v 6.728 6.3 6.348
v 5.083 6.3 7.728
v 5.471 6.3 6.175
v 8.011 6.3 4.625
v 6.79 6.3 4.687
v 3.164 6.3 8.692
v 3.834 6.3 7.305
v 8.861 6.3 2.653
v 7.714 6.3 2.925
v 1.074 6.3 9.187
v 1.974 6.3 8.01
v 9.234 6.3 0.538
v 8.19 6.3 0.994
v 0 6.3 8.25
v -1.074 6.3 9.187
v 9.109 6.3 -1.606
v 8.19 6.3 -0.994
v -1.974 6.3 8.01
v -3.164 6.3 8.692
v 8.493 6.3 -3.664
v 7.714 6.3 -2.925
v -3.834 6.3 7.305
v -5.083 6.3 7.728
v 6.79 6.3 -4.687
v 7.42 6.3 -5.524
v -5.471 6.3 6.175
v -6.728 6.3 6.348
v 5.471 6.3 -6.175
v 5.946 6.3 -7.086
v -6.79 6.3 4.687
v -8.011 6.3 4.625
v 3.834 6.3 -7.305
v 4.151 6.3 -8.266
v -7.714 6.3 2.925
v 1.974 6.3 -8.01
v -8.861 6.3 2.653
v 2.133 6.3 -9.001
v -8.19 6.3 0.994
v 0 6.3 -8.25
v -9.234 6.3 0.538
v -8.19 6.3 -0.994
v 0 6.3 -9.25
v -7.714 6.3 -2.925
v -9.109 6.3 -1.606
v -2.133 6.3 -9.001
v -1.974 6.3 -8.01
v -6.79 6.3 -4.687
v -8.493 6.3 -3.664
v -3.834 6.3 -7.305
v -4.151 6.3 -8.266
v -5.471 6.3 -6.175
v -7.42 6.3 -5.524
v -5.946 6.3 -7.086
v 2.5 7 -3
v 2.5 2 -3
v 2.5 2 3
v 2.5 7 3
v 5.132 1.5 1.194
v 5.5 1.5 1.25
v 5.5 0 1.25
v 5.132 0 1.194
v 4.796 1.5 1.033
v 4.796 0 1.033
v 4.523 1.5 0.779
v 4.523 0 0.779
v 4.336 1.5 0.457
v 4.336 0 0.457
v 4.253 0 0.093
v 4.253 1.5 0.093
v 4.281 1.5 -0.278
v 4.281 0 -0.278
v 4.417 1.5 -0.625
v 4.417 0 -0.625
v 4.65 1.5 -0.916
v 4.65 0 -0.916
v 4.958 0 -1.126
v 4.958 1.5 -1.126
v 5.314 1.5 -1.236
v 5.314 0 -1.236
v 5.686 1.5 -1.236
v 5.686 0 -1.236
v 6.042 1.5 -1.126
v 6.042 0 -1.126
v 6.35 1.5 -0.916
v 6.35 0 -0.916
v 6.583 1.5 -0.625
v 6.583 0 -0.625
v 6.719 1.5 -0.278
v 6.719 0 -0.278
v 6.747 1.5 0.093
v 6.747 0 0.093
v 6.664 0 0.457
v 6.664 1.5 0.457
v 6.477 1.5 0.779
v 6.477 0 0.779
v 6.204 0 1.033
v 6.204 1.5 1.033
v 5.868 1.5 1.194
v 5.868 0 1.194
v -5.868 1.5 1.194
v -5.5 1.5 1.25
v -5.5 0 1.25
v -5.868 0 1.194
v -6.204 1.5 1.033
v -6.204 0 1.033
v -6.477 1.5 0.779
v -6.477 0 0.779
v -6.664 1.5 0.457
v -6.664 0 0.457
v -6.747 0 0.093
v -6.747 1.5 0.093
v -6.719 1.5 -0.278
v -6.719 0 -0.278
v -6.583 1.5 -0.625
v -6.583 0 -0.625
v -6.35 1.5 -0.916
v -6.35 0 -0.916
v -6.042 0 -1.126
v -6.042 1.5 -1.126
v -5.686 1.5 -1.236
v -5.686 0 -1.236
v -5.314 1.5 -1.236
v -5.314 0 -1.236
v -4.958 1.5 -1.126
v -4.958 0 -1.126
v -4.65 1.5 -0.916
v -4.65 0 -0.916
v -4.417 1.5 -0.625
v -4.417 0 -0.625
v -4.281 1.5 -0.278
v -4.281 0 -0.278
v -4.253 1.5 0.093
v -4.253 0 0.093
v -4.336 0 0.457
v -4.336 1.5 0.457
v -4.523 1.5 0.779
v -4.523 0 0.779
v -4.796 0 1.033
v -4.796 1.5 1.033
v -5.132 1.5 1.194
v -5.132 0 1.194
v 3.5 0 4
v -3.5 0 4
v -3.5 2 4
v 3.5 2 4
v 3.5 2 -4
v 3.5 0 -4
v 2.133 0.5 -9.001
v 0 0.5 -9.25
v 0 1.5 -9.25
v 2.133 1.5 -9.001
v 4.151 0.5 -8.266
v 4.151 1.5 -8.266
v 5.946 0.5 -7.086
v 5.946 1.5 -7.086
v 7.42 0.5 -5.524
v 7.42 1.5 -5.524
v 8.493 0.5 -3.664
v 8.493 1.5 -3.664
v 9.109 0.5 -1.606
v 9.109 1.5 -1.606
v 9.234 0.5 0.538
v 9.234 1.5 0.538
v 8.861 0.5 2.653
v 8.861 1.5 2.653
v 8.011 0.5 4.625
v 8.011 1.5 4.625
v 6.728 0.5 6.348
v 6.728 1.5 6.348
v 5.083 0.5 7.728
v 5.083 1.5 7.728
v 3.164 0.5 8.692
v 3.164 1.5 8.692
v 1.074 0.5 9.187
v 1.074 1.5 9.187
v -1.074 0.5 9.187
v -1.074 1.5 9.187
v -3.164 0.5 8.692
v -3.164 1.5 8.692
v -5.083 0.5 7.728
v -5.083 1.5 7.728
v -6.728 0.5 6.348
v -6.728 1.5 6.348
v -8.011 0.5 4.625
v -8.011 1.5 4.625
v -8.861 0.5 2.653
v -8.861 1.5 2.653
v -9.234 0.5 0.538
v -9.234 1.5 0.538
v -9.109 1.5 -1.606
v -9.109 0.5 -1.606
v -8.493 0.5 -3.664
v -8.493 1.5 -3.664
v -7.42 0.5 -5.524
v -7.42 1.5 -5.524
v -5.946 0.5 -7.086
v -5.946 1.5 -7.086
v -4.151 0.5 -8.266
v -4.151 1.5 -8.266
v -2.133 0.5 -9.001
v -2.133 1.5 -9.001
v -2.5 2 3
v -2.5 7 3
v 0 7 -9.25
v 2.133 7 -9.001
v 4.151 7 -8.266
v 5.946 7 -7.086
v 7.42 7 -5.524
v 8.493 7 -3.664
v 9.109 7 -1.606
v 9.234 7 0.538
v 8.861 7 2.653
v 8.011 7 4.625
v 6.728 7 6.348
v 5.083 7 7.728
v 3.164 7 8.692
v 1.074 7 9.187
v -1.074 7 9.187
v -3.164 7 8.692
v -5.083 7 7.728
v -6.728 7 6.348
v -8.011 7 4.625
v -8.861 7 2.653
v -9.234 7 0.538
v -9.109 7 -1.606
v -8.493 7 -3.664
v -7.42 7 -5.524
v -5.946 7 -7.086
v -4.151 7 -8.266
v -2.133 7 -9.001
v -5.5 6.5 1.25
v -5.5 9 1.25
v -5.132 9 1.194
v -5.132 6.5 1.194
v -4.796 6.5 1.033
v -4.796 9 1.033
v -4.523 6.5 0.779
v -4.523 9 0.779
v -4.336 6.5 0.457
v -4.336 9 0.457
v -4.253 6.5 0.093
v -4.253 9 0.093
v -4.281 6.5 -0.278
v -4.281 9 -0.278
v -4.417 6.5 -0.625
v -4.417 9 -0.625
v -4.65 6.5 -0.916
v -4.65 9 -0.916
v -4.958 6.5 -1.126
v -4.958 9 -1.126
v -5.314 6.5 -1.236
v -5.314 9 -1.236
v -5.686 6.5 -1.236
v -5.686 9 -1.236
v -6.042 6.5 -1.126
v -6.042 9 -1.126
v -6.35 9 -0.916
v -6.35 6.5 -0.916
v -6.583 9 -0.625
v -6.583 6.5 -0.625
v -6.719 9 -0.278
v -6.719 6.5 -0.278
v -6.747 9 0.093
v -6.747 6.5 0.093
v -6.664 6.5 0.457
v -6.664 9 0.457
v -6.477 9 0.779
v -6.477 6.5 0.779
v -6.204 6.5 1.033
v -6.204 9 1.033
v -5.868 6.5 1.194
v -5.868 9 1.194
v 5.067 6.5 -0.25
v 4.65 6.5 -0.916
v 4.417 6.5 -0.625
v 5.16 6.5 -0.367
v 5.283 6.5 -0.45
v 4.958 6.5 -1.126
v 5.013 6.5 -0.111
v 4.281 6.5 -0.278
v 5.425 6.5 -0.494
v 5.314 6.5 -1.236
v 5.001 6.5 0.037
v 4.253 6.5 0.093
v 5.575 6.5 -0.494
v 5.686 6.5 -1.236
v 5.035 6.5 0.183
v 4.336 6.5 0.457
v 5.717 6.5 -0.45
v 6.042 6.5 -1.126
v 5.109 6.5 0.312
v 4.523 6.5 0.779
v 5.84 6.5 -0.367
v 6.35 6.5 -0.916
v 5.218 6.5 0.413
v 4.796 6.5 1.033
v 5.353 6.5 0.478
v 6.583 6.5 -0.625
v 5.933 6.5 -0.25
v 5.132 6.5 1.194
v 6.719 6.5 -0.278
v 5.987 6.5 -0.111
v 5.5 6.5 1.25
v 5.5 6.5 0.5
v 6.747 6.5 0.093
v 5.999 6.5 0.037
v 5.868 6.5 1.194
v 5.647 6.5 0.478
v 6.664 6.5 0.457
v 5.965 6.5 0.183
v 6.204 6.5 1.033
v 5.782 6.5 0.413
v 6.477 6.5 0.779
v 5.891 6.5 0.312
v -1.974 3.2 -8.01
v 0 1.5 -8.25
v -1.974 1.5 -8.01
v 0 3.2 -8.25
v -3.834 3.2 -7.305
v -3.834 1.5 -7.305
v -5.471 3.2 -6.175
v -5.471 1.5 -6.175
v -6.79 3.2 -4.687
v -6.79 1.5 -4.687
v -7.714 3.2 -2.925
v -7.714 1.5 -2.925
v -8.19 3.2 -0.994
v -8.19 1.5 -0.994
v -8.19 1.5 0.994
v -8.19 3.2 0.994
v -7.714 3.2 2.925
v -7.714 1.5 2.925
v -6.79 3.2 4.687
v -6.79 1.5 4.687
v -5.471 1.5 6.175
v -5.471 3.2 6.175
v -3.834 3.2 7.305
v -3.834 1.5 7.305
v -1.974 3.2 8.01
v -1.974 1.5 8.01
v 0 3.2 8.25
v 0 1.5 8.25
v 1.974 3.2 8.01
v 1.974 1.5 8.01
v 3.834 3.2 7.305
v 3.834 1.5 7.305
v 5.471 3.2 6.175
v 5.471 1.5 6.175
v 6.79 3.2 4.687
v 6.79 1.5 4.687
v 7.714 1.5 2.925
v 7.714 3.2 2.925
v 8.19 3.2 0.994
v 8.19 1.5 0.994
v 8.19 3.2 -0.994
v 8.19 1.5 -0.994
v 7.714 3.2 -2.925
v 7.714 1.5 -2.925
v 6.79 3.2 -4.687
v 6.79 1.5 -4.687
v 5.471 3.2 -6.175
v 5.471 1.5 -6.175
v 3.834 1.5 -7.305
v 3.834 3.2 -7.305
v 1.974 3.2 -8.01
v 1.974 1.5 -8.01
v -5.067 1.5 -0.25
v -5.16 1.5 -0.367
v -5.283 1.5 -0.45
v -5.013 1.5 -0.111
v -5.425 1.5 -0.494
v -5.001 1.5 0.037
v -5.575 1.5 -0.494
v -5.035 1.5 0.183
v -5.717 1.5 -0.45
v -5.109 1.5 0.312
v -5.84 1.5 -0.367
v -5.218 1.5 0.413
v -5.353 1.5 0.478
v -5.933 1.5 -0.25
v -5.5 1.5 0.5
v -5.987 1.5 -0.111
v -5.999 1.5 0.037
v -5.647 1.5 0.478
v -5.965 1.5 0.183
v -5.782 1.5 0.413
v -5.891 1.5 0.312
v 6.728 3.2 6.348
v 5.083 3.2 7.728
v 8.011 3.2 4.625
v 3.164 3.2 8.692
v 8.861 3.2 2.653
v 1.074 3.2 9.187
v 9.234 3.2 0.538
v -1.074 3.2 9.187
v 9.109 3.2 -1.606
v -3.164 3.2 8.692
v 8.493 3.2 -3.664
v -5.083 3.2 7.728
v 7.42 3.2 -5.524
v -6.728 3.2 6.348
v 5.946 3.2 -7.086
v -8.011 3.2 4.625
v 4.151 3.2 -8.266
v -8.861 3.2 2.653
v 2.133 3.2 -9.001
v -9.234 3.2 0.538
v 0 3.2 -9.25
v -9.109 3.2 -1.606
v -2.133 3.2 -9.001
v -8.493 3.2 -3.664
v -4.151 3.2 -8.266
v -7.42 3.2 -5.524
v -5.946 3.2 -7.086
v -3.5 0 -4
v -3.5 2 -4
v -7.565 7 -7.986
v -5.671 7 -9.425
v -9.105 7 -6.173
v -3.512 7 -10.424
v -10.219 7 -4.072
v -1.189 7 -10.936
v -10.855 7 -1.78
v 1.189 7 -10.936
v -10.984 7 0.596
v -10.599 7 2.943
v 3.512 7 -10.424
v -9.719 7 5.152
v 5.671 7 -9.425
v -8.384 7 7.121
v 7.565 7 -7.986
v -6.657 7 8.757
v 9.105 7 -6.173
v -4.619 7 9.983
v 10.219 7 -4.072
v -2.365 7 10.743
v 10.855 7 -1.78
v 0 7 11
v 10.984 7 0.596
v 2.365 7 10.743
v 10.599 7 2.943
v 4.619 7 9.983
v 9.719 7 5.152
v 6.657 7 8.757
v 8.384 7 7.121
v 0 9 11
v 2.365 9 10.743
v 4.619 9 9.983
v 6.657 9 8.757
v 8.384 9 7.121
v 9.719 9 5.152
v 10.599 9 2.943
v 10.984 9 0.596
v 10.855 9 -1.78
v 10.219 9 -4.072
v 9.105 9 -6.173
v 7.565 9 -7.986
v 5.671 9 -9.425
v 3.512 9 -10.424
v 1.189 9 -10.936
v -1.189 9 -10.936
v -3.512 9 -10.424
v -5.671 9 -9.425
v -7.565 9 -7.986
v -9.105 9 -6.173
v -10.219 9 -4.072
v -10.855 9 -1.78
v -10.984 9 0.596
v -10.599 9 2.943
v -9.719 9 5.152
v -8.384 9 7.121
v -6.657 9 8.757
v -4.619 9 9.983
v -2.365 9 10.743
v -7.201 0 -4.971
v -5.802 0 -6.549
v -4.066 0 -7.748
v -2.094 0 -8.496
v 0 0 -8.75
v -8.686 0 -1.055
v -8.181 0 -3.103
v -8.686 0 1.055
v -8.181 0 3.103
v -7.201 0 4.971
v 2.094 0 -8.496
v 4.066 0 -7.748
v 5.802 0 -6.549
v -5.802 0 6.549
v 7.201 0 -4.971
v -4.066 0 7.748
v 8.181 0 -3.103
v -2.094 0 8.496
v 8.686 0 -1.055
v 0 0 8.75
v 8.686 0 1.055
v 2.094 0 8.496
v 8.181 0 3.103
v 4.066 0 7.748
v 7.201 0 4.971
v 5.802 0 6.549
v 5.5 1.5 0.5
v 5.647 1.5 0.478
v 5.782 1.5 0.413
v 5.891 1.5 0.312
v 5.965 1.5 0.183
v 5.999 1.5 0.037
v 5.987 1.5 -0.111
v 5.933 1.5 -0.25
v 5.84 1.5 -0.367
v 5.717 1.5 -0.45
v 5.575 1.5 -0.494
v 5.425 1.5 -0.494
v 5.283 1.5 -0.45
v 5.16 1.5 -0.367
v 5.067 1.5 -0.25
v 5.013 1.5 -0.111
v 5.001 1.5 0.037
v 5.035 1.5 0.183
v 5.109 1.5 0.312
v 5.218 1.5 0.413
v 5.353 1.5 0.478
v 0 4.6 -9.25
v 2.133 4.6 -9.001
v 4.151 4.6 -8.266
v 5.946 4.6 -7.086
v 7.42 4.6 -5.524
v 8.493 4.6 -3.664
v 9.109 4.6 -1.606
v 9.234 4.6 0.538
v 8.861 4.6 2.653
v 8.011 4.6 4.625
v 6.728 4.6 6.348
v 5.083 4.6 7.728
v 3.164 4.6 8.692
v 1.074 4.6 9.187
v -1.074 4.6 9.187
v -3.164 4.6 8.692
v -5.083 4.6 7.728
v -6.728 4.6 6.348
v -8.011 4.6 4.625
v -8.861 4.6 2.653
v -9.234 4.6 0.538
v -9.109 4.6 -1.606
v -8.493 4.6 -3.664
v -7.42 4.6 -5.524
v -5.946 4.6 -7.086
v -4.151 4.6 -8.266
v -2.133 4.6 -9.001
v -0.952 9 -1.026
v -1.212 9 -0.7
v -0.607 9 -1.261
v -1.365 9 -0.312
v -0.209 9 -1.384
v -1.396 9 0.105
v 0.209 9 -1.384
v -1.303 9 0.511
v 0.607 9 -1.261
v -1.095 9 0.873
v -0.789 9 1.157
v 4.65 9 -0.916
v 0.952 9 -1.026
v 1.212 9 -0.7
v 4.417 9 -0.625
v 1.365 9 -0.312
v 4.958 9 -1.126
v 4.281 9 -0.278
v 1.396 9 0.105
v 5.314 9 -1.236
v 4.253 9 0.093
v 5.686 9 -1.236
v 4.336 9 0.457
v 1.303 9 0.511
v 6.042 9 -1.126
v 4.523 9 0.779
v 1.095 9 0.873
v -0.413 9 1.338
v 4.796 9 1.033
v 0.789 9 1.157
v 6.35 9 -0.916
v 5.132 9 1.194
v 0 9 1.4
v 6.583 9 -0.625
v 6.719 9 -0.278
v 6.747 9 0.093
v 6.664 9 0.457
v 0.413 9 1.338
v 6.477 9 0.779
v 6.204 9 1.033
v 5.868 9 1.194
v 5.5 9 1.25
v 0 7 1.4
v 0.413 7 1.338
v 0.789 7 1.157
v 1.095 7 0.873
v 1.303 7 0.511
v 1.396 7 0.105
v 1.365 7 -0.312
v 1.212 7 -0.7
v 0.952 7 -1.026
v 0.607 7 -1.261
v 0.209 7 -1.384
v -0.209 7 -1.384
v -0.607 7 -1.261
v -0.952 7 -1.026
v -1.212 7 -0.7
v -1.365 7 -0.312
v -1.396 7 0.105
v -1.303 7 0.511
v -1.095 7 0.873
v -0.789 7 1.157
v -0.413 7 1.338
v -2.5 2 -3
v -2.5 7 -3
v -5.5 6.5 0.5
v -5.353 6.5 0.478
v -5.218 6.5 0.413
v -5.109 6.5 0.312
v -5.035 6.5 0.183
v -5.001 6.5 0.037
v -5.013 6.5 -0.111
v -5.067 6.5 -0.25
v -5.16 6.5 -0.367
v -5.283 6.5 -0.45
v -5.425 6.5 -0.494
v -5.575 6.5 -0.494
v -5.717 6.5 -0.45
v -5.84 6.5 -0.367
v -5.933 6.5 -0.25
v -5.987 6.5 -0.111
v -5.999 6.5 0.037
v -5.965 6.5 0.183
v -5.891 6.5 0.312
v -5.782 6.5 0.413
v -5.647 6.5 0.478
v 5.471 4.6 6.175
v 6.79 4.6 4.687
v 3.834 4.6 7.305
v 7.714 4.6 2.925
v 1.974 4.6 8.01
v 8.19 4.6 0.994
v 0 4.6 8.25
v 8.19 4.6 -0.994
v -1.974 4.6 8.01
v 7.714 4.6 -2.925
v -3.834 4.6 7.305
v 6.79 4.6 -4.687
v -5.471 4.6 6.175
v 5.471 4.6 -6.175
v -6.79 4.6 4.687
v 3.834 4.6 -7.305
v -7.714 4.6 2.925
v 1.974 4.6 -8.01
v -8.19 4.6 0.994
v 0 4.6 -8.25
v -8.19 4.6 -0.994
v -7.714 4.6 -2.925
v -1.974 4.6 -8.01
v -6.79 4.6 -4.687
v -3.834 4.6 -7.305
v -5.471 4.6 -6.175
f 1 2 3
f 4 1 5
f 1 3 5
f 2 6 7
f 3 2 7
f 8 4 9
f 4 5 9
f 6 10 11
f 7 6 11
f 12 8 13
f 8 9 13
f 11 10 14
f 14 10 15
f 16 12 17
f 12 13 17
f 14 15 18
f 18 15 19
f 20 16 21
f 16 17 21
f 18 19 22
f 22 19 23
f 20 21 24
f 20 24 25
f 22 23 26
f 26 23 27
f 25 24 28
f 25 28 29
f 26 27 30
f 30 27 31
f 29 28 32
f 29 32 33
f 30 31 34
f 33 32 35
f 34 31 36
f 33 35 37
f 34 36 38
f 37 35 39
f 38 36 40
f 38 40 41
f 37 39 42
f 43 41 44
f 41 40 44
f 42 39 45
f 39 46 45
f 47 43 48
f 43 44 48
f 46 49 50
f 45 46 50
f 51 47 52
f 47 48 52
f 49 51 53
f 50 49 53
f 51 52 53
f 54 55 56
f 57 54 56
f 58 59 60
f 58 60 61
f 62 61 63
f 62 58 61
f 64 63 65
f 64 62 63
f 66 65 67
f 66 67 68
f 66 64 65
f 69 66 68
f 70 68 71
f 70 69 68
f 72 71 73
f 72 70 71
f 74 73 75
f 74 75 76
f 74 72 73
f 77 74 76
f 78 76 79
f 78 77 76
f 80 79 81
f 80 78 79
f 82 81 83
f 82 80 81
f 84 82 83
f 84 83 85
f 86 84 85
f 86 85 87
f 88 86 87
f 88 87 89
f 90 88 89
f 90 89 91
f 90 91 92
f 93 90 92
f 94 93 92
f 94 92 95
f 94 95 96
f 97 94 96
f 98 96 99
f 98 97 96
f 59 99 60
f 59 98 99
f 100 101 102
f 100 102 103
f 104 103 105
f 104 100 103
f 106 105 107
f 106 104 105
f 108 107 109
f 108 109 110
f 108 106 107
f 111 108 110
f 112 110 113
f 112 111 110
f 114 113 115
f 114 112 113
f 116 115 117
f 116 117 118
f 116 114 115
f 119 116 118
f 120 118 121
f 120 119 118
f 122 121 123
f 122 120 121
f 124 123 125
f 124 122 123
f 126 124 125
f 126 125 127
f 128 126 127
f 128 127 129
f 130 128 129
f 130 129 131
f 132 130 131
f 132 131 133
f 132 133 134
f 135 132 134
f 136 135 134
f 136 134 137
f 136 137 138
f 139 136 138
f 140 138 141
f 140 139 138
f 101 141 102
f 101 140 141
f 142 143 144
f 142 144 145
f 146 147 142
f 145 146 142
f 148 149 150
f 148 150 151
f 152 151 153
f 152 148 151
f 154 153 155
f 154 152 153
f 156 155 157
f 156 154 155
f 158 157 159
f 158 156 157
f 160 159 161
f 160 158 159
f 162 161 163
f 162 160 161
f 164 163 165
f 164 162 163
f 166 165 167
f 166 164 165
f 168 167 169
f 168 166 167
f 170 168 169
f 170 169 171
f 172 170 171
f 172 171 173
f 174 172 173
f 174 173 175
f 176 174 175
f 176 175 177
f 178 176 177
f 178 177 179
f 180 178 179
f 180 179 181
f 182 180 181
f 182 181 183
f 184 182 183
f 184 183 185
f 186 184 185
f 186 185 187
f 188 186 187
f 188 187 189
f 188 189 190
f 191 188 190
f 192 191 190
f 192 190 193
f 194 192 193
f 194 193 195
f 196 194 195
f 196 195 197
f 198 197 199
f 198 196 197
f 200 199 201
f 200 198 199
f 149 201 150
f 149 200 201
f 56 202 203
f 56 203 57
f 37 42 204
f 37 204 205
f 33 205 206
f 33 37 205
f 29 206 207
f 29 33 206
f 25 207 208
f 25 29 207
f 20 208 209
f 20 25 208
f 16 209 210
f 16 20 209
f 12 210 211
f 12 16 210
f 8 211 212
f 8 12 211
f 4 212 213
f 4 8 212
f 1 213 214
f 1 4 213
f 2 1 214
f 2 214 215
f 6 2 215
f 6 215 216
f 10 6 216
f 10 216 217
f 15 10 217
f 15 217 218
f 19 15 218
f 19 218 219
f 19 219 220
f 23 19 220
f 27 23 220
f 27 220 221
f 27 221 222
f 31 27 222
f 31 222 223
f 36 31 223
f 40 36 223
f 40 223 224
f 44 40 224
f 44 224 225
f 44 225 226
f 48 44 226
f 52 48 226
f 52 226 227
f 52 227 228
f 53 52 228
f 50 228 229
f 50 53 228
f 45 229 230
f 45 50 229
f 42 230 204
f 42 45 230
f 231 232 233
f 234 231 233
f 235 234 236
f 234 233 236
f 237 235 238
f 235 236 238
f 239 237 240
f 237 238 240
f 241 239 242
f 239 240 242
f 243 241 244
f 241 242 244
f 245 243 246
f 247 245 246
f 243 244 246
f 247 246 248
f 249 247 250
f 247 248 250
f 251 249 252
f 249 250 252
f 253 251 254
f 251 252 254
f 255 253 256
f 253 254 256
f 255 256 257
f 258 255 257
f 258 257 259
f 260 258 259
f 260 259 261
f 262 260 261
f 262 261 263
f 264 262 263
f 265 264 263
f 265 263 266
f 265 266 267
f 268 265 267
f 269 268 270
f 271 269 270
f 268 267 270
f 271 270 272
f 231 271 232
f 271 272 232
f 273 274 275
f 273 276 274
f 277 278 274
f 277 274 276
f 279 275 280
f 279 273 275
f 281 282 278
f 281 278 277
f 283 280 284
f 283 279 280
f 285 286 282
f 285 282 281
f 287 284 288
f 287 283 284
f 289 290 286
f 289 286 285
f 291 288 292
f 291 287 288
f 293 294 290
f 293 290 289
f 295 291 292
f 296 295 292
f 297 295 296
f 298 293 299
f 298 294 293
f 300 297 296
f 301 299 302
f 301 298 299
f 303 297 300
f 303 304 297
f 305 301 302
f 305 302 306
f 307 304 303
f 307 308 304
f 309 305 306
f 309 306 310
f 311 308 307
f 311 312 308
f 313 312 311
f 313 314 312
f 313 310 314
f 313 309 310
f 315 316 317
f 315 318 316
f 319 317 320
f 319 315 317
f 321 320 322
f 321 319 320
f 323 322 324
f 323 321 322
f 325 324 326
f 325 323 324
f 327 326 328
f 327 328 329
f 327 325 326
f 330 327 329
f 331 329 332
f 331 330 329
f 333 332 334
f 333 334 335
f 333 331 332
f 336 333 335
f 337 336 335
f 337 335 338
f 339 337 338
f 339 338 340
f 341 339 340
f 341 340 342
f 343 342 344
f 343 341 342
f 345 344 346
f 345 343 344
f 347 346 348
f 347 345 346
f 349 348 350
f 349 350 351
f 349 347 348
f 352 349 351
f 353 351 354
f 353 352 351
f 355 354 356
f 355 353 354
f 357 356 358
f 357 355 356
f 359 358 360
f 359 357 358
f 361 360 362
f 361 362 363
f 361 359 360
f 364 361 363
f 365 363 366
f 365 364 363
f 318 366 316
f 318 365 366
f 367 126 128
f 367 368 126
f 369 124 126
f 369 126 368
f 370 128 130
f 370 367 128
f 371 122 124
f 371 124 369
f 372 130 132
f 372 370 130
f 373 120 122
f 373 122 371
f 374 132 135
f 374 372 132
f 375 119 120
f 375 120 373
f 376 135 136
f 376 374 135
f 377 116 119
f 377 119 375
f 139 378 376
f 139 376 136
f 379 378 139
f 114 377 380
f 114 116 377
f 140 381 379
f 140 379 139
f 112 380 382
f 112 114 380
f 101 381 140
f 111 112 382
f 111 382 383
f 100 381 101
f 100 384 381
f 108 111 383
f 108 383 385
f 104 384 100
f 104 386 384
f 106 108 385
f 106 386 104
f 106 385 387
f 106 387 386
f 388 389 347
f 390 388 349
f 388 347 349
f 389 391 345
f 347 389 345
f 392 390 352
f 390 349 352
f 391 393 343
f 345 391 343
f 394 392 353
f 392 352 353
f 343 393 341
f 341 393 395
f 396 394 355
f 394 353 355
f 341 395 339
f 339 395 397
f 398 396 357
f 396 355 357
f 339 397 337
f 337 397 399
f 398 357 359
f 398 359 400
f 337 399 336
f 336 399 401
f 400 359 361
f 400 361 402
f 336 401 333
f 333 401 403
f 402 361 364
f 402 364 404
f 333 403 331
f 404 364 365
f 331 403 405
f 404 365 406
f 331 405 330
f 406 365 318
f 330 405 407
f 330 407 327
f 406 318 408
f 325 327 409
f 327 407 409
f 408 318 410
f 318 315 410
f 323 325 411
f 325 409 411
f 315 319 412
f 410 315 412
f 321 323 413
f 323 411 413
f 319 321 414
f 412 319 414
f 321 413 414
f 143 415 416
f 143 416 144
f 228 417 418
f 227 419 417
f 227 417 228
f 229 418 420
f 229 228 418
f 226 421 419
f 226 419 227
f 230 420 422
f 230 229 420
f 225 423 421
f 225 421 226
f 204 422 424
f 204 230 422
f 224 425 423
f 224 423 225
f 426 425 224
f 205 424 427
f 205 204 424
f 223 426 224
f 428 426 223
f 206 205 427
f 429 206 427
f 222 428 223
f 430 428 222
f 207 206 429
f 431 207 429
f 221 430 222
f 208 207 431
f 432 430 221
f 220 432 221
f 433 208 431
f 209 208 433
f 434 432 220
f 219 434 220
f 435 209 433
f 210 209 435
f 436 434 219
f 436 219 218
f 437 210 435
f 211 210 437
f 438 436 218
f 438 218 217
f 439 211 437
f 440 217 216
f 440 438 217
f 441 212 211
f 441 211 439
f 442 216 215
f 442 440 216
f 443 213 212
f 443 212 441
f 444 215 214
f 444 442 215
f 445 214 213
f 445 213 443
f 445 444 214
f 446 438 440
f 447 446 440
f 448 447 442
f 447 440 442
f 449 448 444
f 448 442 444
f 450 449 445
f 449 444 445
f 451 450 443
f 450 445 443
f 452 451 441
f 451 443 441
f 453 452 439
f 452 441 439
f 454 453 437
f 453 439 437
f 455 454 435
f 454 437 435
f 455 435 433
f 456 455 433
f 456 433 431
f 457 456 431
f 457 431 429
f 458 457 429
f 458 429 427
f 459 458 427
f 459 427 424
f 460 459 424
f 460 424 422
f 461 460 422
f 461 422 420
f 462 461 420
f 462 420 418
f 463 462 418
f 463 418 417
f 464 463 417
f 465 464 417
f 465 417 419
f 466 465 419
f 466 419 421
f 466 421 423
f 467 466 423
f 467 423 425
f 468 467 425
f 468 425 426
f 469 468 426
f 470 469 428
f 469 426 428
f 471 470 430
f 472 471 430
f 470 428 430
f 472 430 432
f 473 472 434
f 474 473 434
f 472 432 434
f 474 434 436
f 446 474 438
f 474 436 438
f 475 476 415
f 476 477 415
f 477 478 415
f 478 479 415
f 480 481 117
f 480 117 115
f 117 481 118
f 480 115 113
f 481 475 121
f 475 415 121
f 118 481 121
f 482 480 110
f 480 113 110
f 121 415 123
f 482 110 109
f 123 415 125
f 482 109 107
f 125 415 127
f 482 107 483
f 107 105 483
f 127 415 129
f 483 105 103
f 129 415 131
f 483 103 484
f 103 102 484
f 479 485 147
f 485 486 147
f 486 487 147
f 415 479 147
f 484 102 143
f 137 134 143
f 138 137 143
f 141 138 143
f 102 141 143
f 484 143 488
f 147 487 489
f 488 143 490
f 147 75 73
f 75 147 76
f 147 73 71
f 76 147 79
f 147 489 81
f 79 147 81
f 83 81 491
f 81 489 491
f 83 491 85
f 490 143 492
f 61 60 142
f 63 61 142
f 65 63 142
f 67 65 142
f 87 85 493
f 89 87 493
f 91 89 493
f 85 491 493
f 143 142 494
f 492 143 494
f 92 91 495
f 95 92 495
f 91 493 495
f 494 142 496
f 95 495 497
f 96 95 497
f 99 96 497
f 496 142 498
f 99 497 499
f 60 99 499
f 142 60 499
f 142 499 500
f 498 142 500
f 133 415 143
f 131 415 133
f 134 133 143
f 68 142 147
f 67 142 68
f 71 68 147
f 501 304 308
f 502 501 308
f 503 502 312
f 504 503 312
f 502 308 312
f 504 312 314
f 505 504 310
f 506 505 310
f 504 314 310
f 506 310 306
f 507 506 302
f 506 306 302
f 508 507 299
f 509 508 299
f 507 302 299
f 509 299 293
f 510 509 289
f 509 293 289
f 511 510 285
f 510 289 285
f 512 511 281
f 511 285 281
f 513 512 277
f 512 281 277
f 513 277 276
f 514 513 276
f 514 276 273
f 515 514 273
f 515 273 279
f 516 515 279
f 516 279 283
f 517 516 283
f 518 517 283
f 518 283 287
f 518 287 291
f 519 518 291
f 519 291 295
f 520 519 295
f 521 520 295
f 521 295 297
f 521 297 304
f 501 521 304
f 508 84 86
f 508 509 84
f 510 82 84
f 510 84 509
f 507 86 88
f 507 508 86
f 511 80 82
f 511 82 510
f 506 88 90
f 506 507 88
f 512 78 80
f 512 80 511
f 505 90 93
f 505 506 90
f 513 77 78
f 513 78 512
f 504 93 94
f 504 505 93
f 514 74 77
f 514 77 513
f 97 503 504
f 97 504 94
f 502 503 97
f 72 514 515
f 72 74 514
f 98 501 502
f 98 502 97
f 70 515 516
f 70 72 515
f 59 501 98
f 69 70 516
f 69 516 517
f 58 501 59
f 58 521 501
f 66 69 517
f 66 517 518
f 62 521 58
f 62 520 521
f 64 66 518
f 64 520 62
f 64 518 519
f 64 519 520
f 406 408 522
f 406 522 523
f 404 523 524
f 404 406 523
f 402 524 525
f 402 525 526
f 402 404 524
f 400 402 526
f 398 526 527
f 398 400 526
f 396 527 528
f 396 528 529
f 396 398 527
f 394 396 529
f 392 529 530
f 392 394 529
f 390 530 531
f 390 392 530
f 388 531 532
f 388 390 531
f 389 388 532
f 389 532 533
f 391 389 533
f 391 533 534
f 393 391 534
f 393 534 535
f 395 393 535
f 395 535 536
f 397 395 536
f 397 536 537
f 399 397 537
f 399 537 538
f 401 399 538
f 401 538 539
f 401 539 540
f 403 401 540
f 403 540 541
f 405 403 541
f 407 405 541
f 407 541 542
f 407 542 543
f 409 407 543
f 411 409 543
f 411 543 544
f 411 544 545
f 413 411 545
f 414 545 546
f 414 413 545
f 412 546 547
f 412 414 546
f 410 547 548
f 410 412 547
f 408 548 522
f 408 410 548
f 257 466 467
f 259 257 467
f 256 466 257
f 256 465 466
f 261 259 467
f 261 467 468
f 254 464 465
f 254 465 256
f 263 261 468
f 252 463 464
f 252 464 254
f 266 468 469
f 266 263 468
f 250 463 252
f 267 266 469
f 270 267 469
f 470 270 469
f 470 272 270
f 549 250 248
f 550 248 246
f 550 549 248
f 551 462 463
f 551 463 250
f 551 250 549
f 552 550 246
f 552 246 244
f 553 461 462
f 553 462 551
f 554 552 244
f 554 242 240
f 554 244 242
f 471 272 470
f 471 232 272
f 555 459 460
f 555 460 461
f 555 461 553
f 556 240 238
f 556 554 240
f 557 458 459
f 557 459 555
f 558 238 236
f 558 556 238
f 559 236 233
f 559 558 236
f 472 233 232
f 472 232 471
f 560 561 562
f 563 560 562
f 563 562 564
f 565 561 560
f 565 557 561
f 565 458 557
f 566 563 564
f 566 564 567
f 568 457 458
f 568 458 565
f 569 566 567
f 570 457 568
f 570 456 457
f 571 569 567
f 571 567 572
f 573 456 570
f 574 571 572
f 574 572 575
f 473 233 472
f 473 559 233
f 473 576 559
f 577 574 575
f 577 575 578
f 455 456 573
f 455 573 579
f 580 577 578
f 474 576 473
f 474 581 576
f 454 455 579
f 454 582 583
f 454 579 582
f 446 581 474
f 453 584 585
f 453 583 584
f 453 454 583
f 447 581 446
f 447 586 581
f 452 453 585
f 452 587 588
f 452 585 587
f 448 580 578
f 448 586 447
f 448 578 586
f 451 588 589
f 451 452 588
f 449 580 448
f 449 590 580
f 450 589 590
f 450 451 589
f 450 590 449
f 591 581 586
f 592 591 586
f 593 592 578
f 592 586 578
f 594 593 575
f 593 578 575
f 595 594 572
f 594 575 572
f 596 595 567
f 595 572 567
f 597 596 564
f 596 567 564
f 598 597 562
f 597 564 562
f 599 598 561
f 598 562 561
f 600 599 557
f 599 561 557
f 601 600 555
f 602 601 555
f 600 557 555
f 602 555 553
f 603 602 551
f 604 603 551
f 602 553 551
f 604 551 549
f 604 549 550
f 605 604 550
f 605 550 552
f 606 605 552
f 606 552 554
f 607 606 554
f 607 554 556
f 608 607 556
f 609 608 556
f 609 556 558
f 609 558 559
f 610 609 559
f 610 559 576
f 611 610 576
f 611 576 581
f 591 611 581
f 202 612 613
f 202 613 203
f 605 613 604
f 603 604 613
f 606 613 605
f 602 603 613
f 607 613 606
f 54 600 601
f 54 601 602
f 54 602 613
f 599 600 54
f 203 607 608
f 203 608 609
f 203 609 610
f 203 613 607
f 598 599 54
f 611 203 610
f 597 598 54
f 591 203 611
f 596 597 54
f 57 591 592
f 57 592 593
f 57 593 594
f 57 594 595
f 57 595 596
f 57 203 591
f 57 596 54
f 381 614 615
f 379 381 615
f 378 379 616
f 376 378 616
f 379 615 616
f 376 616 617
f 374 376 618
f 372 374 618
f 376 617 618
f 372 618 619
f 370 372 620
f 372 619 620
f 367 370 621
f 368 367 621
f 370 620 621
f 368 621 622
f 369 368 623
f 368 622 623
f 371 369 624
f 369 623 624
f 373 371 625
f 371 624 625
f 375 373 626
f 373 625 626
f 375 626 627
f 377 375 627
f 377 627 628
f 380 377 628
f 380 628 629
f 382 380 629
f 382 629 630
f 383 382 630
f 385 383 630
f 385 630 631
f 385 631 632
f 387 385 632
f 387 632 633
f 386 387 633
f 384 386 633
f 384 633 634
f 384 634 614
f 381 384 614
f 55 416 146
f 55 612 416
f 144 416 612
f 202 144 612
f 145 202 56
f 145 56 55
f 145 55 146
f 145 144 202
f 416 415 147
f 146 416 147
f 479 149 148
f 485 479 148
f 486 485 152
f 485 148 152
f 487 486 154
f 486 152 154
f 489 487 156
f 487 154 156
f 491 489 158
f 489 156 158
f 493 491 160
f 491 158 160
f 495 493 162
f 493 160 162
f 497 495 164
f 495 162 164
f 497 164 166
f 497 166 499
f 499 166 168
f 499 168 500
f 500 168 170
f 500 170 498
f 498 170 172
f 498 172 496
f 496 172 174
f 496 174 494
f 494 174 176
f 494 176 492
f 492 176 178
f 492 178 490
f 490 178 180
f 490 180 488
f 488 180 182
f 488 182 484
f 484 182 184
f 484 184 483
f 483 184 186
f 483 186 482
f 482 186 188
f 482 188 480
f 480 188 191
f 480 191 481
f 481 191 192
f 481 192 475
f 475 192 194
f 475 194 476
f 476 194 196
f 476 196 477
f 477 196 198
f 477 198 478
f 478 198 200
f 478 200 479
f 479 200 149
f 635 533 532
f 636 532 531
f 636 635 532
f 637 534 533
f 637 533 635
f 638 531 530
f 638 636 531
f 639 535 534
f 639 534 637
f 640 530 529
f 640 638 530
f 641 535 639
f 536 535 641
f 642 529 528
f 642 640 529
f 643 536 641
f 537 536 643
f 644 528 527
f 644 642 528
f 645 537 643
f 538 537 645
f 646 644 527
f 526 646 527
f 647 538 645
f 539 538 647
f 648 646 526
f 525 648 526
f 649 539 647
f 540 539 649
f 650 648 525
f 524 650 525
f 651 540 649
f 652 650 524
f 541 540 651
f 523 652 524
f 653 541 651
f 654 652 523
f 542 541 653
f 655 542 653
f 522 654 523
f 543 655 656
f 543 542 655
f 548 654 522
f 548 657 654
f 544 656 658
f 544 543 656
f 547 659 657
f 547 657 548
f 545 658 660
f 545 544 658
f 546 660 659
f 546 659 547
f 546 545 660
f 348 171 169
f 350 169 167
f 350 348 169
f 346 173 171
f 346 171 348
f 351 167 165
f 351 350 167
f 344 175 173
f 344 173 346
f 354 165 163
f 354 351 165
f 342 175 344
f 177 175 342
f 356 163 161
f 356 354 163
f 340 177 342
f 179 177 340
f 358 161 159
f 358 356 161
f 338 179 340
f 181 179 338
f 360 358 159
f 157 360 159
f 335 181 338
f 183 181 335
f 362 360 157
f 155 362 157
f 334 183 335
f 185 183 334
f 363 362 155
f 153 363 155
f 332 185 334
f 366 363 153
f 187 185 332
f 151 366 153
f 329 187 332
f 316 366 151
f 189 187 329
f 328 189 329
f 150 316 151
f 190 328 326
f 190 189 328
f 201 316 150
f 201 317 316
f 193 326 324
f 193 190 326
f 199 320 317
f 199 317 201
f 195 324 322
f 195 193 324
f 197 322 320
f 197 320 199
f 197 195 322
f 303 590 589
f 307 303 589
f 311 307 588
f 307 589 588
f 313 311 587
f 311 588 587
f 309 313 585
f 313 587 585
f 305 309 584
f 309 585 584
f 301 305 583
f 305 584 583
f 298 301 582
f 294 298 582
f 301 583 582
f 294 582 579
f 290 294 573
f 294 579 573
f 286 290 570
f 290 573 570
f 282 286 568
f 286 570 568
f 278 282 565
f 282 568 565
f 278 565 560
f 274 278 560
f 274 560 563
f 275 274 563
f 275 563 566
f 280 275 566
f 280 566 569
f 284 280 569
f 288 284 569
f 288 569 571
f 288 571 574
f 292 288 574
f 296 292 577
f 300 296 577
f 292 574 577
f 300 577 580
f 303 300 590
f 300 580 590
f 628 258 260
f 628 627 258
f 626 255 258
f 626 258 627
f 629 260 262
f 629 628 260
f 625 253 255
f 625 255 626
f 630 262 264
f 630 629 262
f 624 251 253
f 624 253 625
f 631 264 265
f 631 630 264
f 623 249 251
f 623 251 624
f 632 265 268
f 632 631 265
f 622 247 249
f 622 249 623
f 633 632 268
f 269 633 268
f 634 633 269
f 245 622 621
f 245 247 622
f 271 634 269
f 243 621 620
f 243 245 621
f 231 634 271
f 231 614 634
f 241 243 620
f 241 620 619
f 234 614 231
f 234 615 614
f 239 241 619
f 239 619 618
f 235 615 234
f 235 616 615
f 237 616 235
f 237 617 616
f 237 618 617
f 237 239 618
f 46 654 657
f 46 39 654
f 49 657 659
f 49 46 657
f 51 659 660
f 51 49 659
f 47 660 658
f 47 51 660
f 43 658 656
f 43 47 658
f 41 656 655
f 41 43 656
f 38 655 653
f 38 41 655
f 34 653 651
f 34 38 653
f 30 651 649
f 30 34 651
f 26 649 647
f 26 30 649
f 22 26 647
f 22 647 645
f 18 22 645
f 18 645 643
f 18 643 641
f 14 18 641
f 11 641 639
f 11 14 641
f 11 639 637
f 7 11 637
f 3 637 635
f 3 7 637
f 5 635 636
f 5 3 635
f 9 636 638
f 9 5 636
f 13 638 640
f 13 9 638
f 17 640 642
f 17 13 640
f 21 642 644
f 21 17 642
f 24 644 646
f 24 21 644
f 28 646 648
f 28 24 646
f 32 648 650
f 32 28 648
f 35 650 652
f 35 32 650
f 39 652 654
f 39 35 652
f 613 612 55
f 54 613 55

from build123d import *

# Parameters (mm, degrees)
SKETCH_1_R          = 11
EXTRUDE_1_DEPTH     = 9
SKETCH_2_R          = 0.5
CUT_EXTRUDE_1_DEPTH = 18.972200756
SKETCH_3_R          = 16.549134696
SKETCH_3_R_2        = 9.25
CUT_EXTRUDE_2_DEPTH = 7
SKETCH_4_W          = 2
SKETCH_4_H          = 1.7
SKETCH_5_W          = 5
SKETCH_5_H          = 6
CUT_EXTRUDE_3_DEPTH = 7
SKETCH_6_R          = 1.4
CUT_EXTRUDE_4_DEPTH = 7
SKETCH_7_R          = 1.25
CUT_EXTRUDE_5_DEPTH = 2.5
CUT_EXTRUDE_START   = -1.5
SKETCH_8_R          = 1.25
CUT_EXTRUDE_6_DEPTH = 1.5
SKETCH_9_W          = 7
SKETCH_9_H          = 8
SKETCH_9_W_2        = 5
SKETCH_9_H_2        = 6
CUT_EXTRUDE_7_DEPTH = 2
CHAMFER_1_SIZE      = 0.5


with BuildPart() as part:
    # 草图1 → 凸台-拉伸1 (new body)
    with BuildSketch(Plane(origin=(0, 0, 0), x_dir=(1, 0, 0), z_dir=(0, 1, 0))):
        with Locations(Location((0, 0, 0), (0, 0, 270))):
            Circle(SKETCH_1_R)
    extrude(amount=EXTRUDE_1_DEPTH)

    # 草图2 → 切除-拉伸1 (cut, through all)
    with BuildSketch(Plane(origin=(0, 9, 0), x_dir=(1, 0, 0), z_dir=(0, 1, 0))):
        with Locations(Location((-5.5, 0, 0), (0, 0, 270))):
            Circle(SKETCH_2_R)
        with Locations(Location((5.5, 0, 0), (0, 0, 270))):
            Circle(SKETCH_2_R)
    extrude(amount=-CUT_EXTRUDE_1_DEPTH, mode=Mode.SUBTRACT)

    # 草图3 → 切除-拉伸2 (cut)
    with BuildSketch(Plane.XZ):
        Circle(SKETCH_3_R)
        with Locations(Location((0, 0, 0), (0, 0, 270))):
            Circle(SKETCH_3_R_2, mode=Mode.SUBTRACT)
    extrude(amount=-CUT_EXTRUDE_2_DEPTH, mode=Mode.SUBTRACT)

    # 草图4 → 切除-旋转1 (revolve, cut)
    with BuildSketch(Plane.XY, mode=Mode.PRIVATE) as cut_revolve_1_sk:
        with Locations((-9.25, 5.45)):
            Rectangle(SKETCH_4_W, SKETCH_4_H)
        with Locations((-9.25, 2.35)):
            Rectangle(SKETCH_4_W, SKETCH_4_H)
    revolve(cut_revolve_1_sk.sketch.rotate(Axis((0, 0, 0), (0, 1, 0)), 270), axis=Axis((0, 0, 0), (0, 1, 0)), mode=Mode.SUBTRACT)

    # 草图5 → 切除-拉伸3 (cut)
    with BuildSketch(Plane.XZ):
        Rectangle(SKETCH_5_W, SKETCH_5_H)
    extrude(amount=-CUT_EXTRUDE_3_DEPTH, mode=Mode.SUBTRACT)

    # 草图6 → 切除-拉伸4 (cut)
    with BuildSketch(Plane(origin=(0, 9, 0), x_dir=(1, 0, 0), z_dir=(0, 1, 0))):
        with Locations(Location((0, 0, 0), (0, 0, 270))):
            Circle(SKETCH_6_R)
    extrude(amount=-CUT_EXTRUDE_4_DEPTH, mode=Mode.SUBTRACT)

    # 草图7 → 切除-拉伸5 (cut)
    with BuildSketch(Plane(origin=(0, 9, 0), x_dir=(1, 0, 0), z_dir=(0, 1, 0))):
        with Locations(Location((-5.5, 0, 0), (0, 0, 270))):
            Circle(SKETCH_7_R)
        with Locations(Location((5.5, 0, 0), (0, 0, 270))):
            Circle(SKETCH_7_R)
    extrude(amount=-CUT_EXTRUDE_5_DEPTH, mode=Mode.SUBTRACT)

    # 草图8 → 切除-拉伸6 (cut)
    with BuildSketch(Plane.XZ.offset(CUT_EXTRUDE_START)):
        with Locations(Location((-5.5, 0, 0), (0, 0, 90))):
            Circle(SKETCH_8_R)
        with Locations(Location((5.5, 0, 0), (0, 0, 90))):
            Circle(SKETCH_8_R)
    extrude(amount=CUT_EXTRUDE_6_DEPTH, mode=Mode.SUBTRACT)

    # 草图9 → 切除-拉伸7 (cut)
    with BuildSketch(Plane.XZ):
        Rectangle(SKETCH_9_W, SKETCH_9_H)
        Rectangle(SKETCH_9_W_2, SKETCH_9_H_2, mode=Mode.SUBTRACT)
    extrude(amount=-CUT_EXTRUDE_7_DEPTH, mode=Mode.SUBTRACT)

    # 倒角1
    chamfer_1_edges = [part.edges().sort_by_distance(p)[0] for p in [
        (0, 0, 9.25),
    ]]
    chamfer(chamfer_1_edges, length=CHAMFER_1_SIZE)


solid = part.part
